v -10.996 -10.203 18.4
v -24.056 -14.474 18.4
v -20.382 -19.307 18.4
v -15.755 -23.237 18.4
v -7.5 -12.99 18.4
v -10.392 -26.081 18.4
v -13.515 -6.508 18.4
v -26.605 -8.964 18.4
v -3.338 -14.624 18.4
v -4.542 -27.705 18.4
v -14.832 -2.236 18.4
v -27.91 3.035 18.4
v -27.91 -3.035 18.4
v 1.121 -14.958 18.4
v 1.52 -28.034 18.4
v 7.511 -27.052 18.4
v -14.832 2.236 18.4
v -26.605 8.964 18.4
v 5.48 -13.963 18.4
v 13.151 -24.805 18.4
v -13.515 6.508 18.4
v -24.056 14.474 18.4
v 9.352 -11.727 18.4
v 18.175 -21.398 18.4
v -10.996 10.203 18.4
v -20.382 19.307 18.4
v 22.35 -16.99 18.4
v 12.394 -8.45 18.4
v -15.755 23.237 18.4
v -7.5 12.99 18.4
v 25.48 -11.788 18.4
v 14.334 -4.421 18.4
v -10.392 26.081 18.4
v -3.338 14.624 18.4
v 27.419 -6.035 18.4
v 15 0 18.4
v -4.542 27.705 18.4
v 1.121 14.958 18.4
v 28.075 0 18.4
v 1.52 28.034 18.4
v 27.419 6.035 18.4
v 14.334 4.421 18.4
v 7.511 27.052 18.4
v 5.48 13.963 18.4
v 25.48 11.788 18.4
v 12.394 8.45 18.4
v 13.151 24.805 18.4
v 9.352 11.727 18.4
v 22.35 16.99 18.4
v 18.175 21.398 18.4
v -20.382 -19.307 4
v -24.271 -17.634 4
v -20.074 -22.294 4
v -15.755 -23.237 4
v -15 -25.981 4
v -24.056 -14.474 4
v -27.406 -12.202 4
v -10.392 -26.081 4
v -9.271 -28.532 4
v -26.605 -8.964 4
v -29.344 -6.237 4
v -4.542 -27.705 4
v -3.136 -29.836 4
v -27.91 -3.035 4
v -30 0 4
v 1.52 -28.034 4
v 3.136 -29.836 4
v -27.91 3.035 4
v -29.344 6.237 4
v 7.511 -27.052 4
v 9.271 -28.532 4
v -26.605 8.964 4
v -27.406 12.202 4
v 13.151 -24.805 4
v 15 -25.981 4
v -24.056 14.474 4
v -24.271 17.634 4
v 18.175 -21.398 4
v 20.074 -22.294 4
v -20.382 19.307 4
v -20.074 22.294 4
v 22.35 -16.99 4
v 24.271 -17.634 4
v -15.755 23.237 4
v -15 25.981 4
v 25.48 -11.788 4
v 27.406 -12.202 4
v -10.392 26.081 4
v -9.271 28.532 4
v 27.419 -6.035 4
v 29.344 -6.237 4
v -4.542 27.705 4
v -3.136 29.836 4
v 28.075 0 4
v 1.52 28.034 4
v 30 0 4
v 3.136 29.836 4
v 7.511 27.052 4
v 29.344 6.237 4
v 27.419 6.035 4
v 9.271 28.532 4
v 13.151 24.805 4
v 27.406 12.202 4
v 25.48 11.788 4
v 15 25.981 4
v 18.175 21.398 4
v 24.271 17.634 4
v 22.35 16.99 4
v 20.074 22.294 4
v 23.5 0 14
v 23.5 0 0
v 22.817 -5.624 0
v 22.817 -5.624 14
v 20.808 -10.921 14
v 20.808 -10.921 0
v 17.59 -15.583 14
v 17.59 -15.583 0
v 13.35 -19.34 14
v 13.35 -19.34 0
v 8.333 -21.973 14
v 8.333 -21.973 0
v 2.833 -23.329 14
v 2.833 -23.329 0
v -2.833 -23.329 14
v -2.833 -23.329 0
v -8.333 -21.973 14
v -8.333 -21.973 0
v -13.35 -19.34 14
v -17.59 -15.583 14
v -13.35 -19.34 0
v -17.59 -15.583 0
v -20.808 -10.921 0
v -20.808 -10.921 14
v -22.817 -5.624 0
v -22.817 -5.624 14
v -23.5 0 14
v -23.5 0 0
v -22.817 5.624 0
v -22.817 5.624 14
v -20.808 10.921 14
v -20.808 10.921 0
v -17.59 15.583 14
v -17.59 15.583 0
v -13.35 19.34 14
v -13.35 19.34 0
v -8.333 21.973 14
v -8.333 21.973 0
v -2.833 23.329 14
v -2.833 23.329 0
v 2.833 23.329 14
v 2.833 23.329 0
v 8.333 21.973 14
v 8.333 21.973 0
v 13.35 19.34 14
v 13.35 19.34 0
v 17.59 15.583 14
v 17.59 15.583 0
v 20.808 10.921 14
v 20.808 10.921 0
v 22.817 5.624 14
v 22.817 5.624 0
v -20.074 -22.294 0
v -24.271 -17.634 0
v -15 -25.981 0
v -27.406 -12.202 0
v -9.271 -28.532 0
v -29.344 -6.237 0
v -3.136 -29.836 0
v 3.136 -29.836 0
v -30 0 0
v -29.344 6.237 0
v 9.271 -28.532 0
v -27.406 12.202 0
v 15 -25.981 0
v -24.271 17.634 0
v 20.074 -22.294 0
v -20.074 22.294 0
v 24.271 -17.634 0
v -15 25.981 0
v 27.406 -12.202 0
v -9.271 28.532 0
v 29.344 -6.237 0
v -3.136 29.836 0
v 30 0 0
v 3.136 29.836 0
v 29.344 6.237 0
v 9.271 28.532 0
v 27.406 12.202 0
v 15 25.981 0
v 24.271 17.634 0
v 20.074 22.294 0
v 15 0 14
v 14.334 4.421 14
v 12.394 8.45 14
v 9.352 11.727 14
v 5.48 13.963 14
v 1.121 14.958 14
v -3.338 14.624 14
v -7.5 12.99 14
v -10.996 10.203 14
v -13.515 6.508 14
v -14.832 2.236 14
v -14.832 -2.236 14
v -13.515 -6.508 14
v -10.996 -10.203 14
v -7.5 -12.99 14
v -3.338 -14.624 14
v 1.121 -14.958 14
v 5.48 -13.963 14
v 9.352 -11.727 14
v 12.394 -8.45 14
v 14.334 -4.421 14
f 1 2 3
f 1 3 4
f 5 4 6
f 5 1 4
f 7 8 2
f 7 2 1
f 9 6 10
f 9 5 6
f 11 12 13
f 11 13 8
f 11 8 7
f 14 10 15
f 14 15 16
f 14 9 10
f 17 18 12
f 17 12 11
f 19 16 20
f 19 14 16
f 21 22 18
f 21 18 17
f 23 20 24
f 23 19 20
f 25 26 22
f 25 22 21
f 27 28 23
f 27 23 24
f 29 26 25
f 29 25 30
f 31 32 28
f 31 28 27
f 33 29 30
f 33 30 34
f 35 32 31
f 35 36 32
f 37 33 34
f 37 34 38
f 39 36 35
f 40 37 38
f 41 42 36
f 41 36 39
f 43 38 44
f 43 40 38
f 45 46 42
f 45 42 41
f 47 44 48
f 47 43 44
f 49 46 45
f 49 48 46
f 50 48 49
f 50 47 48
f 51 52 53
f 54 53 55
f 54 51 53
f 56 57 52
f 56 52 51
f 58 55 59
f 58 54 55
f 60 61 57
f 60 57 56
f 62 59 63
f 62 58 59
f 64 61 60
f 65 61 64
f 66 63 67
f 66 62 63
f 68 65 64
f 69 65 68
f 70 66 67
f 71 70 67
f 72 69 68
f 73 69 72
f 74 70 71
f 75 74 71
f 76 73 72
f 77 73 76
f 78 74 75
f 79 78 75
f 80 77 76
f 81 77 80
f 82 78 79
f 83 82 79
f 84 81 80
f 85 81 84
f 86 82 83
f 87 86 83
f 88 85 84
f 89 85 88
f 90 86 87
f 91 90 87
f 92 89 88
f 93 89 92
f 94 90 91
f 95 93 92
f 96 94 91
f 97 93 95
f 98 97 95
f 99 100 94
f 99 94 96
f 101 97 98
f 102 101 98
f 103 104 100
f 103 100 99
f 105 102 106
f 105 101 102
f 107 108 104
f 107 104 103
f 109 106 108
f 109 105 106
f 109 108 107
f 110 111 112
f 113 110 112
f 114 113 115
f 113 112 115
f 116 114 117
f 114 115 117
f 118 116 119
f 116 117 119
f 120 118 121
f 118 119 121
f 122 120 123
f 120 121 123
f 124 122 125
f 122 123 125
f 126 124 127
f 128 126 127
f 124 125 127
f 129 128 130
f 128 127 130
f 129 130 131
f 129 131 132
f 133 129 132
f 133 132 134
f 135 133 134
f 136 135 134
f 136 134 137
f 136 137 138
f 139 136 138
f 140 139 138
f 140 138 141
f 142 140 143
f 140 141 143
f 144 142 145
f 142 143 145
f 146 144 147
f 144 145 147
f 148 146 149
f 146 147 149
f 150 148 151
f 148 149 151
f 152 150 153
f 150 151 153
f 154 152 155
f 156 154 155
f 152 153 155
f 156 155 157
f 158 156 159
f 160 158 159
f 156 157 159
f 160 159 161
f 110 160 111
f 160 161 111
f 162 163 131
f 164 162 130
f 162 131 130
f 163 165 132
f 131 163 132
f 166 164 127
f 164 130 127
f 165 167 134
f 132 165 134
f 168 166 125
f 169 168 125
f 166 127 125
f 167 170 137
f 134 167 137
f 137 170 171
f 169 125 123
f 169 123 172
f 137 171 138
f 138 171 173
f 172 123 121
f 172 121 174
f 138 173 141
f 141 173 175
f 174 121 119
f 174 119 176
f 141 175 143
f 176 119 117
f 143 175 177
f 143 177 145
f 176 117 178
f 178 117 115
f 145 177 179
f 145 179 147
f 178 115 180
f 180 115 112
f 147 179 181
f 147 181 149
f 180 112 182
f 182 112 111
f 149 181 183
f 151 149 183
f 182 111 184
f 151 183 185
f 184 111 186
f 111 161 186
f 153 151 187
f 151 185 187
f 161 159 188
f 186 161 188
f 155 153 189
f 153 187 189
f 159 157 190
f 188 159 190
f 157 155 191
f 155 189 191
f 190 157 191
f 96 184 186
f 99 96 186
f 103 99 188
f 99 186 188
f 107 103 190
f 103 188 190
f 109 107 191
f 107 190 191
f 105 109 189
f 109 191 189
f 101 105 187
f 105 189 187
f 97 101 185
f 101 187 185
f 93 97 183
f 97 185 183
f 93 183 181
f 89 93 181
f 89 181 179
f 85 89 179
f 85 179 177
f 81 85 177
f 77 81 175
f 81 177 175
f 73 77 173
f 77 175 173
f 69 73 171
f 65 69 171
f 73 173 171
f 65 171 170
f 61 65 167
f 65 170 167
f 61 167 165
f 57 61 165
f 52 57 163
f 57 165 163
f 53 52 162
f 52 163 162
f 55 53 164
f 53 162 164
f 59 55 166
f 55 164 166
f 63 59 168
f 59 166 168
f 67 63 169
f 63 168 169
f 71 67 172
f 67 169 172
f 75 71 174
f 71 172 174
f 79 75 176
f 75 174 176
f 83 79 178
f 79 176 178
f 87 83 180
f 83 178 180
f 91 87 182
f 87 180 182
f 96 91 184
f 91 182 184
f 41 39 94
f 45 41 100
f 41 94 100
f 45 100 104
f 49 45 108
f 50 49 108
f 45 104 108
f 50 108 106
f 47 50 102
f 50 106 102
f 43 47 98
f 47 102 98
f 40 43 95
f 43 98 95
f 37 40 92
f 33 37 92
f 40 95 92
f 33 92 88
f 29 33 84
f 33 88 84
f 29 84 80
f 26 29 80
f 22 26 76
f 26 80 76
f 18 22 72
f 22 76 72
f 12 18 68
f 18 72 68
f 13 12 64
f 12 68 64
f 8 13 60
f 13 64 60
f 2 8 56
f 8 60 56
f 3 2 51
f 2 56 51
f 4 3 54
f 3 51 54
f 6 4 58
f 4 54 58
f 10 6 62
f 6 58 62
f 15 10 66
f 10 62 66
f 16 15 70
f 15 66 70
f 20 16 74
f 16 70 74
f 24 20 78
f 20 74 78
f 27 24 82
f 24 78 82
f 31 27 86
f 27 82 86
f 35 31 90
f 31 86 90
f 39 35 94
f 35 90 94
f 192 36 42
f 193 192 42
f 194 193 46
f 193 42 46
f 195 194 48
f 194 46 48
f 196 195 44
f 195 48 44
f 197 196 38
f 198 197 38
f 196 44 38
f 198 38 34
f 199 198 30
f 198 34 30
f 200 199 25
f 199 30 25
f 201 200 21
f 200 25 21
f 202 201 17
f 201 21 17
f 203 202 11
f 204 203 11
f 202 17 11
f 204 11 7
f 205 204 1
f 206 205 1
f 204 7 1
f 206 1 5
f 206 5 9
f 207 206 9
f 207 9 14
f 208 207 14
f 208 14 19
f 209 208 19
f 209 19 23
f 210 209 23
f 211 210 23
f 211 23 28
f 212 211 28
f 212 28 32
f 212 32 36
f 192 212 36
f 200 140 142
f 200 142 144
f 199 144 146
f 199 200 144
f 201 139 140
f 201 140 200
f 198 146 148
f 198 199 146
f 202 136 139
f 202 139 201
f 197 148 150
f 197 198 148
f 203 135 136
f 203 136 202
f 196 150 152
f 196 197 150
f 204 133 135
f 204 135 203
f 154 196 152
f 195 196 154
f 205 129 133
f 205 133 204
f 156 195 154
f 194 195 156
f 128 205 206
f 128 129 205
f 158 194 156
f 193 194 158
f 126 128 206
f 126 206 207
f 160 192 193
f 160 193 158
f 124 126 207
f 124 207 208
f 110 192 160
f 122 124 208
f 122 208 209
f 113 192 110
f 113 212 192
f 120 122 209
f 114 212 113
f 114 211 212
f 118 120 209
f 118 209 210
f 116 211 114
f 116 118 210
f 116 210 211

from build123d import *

# Parameters (mm, degrees)
F0_R     = 30
F1_DEPTH = 4
F2_R     = 28.075
F3_DEPTH = 14.4
F4_R     = 23.5
F5_DEPTH = 14
F6_R     = 15
F7_DEPTH = 18.401


with BuildPart() as f1:
    # F0 (on Top) → F1 (new body)
    with BuildSketch(Plane.XY):
        Circle(F0_R)
    extrude(amount=F1_DEPTH)

    # F2 (on face) → F3 (join)
    with BuildSketch(Plane.XY.offset(4)):
        Circle(F2_R)
    extrude(amount=F3_DEPTH)

    # F4 (on face) → F5 (cut)
    with BuildSketch(Plane(origin=(0, 0, 0), x_dir=(1, 0, 0), z_dir=(0, 0, -1))):
        Circle(F4_R)
    extrude(amount=-F5_DEPTH, mode=Mode.SUBTRACT)

    # F6 (on face) → F7 (cut, through all)
    with BuildSketch(Plane.XY.offset(18.4)):
        Circle(F6_R)
    extrude(amount=-F7_DEPTH, mode=Mode.SUBTRACT)


solid = f1.part
